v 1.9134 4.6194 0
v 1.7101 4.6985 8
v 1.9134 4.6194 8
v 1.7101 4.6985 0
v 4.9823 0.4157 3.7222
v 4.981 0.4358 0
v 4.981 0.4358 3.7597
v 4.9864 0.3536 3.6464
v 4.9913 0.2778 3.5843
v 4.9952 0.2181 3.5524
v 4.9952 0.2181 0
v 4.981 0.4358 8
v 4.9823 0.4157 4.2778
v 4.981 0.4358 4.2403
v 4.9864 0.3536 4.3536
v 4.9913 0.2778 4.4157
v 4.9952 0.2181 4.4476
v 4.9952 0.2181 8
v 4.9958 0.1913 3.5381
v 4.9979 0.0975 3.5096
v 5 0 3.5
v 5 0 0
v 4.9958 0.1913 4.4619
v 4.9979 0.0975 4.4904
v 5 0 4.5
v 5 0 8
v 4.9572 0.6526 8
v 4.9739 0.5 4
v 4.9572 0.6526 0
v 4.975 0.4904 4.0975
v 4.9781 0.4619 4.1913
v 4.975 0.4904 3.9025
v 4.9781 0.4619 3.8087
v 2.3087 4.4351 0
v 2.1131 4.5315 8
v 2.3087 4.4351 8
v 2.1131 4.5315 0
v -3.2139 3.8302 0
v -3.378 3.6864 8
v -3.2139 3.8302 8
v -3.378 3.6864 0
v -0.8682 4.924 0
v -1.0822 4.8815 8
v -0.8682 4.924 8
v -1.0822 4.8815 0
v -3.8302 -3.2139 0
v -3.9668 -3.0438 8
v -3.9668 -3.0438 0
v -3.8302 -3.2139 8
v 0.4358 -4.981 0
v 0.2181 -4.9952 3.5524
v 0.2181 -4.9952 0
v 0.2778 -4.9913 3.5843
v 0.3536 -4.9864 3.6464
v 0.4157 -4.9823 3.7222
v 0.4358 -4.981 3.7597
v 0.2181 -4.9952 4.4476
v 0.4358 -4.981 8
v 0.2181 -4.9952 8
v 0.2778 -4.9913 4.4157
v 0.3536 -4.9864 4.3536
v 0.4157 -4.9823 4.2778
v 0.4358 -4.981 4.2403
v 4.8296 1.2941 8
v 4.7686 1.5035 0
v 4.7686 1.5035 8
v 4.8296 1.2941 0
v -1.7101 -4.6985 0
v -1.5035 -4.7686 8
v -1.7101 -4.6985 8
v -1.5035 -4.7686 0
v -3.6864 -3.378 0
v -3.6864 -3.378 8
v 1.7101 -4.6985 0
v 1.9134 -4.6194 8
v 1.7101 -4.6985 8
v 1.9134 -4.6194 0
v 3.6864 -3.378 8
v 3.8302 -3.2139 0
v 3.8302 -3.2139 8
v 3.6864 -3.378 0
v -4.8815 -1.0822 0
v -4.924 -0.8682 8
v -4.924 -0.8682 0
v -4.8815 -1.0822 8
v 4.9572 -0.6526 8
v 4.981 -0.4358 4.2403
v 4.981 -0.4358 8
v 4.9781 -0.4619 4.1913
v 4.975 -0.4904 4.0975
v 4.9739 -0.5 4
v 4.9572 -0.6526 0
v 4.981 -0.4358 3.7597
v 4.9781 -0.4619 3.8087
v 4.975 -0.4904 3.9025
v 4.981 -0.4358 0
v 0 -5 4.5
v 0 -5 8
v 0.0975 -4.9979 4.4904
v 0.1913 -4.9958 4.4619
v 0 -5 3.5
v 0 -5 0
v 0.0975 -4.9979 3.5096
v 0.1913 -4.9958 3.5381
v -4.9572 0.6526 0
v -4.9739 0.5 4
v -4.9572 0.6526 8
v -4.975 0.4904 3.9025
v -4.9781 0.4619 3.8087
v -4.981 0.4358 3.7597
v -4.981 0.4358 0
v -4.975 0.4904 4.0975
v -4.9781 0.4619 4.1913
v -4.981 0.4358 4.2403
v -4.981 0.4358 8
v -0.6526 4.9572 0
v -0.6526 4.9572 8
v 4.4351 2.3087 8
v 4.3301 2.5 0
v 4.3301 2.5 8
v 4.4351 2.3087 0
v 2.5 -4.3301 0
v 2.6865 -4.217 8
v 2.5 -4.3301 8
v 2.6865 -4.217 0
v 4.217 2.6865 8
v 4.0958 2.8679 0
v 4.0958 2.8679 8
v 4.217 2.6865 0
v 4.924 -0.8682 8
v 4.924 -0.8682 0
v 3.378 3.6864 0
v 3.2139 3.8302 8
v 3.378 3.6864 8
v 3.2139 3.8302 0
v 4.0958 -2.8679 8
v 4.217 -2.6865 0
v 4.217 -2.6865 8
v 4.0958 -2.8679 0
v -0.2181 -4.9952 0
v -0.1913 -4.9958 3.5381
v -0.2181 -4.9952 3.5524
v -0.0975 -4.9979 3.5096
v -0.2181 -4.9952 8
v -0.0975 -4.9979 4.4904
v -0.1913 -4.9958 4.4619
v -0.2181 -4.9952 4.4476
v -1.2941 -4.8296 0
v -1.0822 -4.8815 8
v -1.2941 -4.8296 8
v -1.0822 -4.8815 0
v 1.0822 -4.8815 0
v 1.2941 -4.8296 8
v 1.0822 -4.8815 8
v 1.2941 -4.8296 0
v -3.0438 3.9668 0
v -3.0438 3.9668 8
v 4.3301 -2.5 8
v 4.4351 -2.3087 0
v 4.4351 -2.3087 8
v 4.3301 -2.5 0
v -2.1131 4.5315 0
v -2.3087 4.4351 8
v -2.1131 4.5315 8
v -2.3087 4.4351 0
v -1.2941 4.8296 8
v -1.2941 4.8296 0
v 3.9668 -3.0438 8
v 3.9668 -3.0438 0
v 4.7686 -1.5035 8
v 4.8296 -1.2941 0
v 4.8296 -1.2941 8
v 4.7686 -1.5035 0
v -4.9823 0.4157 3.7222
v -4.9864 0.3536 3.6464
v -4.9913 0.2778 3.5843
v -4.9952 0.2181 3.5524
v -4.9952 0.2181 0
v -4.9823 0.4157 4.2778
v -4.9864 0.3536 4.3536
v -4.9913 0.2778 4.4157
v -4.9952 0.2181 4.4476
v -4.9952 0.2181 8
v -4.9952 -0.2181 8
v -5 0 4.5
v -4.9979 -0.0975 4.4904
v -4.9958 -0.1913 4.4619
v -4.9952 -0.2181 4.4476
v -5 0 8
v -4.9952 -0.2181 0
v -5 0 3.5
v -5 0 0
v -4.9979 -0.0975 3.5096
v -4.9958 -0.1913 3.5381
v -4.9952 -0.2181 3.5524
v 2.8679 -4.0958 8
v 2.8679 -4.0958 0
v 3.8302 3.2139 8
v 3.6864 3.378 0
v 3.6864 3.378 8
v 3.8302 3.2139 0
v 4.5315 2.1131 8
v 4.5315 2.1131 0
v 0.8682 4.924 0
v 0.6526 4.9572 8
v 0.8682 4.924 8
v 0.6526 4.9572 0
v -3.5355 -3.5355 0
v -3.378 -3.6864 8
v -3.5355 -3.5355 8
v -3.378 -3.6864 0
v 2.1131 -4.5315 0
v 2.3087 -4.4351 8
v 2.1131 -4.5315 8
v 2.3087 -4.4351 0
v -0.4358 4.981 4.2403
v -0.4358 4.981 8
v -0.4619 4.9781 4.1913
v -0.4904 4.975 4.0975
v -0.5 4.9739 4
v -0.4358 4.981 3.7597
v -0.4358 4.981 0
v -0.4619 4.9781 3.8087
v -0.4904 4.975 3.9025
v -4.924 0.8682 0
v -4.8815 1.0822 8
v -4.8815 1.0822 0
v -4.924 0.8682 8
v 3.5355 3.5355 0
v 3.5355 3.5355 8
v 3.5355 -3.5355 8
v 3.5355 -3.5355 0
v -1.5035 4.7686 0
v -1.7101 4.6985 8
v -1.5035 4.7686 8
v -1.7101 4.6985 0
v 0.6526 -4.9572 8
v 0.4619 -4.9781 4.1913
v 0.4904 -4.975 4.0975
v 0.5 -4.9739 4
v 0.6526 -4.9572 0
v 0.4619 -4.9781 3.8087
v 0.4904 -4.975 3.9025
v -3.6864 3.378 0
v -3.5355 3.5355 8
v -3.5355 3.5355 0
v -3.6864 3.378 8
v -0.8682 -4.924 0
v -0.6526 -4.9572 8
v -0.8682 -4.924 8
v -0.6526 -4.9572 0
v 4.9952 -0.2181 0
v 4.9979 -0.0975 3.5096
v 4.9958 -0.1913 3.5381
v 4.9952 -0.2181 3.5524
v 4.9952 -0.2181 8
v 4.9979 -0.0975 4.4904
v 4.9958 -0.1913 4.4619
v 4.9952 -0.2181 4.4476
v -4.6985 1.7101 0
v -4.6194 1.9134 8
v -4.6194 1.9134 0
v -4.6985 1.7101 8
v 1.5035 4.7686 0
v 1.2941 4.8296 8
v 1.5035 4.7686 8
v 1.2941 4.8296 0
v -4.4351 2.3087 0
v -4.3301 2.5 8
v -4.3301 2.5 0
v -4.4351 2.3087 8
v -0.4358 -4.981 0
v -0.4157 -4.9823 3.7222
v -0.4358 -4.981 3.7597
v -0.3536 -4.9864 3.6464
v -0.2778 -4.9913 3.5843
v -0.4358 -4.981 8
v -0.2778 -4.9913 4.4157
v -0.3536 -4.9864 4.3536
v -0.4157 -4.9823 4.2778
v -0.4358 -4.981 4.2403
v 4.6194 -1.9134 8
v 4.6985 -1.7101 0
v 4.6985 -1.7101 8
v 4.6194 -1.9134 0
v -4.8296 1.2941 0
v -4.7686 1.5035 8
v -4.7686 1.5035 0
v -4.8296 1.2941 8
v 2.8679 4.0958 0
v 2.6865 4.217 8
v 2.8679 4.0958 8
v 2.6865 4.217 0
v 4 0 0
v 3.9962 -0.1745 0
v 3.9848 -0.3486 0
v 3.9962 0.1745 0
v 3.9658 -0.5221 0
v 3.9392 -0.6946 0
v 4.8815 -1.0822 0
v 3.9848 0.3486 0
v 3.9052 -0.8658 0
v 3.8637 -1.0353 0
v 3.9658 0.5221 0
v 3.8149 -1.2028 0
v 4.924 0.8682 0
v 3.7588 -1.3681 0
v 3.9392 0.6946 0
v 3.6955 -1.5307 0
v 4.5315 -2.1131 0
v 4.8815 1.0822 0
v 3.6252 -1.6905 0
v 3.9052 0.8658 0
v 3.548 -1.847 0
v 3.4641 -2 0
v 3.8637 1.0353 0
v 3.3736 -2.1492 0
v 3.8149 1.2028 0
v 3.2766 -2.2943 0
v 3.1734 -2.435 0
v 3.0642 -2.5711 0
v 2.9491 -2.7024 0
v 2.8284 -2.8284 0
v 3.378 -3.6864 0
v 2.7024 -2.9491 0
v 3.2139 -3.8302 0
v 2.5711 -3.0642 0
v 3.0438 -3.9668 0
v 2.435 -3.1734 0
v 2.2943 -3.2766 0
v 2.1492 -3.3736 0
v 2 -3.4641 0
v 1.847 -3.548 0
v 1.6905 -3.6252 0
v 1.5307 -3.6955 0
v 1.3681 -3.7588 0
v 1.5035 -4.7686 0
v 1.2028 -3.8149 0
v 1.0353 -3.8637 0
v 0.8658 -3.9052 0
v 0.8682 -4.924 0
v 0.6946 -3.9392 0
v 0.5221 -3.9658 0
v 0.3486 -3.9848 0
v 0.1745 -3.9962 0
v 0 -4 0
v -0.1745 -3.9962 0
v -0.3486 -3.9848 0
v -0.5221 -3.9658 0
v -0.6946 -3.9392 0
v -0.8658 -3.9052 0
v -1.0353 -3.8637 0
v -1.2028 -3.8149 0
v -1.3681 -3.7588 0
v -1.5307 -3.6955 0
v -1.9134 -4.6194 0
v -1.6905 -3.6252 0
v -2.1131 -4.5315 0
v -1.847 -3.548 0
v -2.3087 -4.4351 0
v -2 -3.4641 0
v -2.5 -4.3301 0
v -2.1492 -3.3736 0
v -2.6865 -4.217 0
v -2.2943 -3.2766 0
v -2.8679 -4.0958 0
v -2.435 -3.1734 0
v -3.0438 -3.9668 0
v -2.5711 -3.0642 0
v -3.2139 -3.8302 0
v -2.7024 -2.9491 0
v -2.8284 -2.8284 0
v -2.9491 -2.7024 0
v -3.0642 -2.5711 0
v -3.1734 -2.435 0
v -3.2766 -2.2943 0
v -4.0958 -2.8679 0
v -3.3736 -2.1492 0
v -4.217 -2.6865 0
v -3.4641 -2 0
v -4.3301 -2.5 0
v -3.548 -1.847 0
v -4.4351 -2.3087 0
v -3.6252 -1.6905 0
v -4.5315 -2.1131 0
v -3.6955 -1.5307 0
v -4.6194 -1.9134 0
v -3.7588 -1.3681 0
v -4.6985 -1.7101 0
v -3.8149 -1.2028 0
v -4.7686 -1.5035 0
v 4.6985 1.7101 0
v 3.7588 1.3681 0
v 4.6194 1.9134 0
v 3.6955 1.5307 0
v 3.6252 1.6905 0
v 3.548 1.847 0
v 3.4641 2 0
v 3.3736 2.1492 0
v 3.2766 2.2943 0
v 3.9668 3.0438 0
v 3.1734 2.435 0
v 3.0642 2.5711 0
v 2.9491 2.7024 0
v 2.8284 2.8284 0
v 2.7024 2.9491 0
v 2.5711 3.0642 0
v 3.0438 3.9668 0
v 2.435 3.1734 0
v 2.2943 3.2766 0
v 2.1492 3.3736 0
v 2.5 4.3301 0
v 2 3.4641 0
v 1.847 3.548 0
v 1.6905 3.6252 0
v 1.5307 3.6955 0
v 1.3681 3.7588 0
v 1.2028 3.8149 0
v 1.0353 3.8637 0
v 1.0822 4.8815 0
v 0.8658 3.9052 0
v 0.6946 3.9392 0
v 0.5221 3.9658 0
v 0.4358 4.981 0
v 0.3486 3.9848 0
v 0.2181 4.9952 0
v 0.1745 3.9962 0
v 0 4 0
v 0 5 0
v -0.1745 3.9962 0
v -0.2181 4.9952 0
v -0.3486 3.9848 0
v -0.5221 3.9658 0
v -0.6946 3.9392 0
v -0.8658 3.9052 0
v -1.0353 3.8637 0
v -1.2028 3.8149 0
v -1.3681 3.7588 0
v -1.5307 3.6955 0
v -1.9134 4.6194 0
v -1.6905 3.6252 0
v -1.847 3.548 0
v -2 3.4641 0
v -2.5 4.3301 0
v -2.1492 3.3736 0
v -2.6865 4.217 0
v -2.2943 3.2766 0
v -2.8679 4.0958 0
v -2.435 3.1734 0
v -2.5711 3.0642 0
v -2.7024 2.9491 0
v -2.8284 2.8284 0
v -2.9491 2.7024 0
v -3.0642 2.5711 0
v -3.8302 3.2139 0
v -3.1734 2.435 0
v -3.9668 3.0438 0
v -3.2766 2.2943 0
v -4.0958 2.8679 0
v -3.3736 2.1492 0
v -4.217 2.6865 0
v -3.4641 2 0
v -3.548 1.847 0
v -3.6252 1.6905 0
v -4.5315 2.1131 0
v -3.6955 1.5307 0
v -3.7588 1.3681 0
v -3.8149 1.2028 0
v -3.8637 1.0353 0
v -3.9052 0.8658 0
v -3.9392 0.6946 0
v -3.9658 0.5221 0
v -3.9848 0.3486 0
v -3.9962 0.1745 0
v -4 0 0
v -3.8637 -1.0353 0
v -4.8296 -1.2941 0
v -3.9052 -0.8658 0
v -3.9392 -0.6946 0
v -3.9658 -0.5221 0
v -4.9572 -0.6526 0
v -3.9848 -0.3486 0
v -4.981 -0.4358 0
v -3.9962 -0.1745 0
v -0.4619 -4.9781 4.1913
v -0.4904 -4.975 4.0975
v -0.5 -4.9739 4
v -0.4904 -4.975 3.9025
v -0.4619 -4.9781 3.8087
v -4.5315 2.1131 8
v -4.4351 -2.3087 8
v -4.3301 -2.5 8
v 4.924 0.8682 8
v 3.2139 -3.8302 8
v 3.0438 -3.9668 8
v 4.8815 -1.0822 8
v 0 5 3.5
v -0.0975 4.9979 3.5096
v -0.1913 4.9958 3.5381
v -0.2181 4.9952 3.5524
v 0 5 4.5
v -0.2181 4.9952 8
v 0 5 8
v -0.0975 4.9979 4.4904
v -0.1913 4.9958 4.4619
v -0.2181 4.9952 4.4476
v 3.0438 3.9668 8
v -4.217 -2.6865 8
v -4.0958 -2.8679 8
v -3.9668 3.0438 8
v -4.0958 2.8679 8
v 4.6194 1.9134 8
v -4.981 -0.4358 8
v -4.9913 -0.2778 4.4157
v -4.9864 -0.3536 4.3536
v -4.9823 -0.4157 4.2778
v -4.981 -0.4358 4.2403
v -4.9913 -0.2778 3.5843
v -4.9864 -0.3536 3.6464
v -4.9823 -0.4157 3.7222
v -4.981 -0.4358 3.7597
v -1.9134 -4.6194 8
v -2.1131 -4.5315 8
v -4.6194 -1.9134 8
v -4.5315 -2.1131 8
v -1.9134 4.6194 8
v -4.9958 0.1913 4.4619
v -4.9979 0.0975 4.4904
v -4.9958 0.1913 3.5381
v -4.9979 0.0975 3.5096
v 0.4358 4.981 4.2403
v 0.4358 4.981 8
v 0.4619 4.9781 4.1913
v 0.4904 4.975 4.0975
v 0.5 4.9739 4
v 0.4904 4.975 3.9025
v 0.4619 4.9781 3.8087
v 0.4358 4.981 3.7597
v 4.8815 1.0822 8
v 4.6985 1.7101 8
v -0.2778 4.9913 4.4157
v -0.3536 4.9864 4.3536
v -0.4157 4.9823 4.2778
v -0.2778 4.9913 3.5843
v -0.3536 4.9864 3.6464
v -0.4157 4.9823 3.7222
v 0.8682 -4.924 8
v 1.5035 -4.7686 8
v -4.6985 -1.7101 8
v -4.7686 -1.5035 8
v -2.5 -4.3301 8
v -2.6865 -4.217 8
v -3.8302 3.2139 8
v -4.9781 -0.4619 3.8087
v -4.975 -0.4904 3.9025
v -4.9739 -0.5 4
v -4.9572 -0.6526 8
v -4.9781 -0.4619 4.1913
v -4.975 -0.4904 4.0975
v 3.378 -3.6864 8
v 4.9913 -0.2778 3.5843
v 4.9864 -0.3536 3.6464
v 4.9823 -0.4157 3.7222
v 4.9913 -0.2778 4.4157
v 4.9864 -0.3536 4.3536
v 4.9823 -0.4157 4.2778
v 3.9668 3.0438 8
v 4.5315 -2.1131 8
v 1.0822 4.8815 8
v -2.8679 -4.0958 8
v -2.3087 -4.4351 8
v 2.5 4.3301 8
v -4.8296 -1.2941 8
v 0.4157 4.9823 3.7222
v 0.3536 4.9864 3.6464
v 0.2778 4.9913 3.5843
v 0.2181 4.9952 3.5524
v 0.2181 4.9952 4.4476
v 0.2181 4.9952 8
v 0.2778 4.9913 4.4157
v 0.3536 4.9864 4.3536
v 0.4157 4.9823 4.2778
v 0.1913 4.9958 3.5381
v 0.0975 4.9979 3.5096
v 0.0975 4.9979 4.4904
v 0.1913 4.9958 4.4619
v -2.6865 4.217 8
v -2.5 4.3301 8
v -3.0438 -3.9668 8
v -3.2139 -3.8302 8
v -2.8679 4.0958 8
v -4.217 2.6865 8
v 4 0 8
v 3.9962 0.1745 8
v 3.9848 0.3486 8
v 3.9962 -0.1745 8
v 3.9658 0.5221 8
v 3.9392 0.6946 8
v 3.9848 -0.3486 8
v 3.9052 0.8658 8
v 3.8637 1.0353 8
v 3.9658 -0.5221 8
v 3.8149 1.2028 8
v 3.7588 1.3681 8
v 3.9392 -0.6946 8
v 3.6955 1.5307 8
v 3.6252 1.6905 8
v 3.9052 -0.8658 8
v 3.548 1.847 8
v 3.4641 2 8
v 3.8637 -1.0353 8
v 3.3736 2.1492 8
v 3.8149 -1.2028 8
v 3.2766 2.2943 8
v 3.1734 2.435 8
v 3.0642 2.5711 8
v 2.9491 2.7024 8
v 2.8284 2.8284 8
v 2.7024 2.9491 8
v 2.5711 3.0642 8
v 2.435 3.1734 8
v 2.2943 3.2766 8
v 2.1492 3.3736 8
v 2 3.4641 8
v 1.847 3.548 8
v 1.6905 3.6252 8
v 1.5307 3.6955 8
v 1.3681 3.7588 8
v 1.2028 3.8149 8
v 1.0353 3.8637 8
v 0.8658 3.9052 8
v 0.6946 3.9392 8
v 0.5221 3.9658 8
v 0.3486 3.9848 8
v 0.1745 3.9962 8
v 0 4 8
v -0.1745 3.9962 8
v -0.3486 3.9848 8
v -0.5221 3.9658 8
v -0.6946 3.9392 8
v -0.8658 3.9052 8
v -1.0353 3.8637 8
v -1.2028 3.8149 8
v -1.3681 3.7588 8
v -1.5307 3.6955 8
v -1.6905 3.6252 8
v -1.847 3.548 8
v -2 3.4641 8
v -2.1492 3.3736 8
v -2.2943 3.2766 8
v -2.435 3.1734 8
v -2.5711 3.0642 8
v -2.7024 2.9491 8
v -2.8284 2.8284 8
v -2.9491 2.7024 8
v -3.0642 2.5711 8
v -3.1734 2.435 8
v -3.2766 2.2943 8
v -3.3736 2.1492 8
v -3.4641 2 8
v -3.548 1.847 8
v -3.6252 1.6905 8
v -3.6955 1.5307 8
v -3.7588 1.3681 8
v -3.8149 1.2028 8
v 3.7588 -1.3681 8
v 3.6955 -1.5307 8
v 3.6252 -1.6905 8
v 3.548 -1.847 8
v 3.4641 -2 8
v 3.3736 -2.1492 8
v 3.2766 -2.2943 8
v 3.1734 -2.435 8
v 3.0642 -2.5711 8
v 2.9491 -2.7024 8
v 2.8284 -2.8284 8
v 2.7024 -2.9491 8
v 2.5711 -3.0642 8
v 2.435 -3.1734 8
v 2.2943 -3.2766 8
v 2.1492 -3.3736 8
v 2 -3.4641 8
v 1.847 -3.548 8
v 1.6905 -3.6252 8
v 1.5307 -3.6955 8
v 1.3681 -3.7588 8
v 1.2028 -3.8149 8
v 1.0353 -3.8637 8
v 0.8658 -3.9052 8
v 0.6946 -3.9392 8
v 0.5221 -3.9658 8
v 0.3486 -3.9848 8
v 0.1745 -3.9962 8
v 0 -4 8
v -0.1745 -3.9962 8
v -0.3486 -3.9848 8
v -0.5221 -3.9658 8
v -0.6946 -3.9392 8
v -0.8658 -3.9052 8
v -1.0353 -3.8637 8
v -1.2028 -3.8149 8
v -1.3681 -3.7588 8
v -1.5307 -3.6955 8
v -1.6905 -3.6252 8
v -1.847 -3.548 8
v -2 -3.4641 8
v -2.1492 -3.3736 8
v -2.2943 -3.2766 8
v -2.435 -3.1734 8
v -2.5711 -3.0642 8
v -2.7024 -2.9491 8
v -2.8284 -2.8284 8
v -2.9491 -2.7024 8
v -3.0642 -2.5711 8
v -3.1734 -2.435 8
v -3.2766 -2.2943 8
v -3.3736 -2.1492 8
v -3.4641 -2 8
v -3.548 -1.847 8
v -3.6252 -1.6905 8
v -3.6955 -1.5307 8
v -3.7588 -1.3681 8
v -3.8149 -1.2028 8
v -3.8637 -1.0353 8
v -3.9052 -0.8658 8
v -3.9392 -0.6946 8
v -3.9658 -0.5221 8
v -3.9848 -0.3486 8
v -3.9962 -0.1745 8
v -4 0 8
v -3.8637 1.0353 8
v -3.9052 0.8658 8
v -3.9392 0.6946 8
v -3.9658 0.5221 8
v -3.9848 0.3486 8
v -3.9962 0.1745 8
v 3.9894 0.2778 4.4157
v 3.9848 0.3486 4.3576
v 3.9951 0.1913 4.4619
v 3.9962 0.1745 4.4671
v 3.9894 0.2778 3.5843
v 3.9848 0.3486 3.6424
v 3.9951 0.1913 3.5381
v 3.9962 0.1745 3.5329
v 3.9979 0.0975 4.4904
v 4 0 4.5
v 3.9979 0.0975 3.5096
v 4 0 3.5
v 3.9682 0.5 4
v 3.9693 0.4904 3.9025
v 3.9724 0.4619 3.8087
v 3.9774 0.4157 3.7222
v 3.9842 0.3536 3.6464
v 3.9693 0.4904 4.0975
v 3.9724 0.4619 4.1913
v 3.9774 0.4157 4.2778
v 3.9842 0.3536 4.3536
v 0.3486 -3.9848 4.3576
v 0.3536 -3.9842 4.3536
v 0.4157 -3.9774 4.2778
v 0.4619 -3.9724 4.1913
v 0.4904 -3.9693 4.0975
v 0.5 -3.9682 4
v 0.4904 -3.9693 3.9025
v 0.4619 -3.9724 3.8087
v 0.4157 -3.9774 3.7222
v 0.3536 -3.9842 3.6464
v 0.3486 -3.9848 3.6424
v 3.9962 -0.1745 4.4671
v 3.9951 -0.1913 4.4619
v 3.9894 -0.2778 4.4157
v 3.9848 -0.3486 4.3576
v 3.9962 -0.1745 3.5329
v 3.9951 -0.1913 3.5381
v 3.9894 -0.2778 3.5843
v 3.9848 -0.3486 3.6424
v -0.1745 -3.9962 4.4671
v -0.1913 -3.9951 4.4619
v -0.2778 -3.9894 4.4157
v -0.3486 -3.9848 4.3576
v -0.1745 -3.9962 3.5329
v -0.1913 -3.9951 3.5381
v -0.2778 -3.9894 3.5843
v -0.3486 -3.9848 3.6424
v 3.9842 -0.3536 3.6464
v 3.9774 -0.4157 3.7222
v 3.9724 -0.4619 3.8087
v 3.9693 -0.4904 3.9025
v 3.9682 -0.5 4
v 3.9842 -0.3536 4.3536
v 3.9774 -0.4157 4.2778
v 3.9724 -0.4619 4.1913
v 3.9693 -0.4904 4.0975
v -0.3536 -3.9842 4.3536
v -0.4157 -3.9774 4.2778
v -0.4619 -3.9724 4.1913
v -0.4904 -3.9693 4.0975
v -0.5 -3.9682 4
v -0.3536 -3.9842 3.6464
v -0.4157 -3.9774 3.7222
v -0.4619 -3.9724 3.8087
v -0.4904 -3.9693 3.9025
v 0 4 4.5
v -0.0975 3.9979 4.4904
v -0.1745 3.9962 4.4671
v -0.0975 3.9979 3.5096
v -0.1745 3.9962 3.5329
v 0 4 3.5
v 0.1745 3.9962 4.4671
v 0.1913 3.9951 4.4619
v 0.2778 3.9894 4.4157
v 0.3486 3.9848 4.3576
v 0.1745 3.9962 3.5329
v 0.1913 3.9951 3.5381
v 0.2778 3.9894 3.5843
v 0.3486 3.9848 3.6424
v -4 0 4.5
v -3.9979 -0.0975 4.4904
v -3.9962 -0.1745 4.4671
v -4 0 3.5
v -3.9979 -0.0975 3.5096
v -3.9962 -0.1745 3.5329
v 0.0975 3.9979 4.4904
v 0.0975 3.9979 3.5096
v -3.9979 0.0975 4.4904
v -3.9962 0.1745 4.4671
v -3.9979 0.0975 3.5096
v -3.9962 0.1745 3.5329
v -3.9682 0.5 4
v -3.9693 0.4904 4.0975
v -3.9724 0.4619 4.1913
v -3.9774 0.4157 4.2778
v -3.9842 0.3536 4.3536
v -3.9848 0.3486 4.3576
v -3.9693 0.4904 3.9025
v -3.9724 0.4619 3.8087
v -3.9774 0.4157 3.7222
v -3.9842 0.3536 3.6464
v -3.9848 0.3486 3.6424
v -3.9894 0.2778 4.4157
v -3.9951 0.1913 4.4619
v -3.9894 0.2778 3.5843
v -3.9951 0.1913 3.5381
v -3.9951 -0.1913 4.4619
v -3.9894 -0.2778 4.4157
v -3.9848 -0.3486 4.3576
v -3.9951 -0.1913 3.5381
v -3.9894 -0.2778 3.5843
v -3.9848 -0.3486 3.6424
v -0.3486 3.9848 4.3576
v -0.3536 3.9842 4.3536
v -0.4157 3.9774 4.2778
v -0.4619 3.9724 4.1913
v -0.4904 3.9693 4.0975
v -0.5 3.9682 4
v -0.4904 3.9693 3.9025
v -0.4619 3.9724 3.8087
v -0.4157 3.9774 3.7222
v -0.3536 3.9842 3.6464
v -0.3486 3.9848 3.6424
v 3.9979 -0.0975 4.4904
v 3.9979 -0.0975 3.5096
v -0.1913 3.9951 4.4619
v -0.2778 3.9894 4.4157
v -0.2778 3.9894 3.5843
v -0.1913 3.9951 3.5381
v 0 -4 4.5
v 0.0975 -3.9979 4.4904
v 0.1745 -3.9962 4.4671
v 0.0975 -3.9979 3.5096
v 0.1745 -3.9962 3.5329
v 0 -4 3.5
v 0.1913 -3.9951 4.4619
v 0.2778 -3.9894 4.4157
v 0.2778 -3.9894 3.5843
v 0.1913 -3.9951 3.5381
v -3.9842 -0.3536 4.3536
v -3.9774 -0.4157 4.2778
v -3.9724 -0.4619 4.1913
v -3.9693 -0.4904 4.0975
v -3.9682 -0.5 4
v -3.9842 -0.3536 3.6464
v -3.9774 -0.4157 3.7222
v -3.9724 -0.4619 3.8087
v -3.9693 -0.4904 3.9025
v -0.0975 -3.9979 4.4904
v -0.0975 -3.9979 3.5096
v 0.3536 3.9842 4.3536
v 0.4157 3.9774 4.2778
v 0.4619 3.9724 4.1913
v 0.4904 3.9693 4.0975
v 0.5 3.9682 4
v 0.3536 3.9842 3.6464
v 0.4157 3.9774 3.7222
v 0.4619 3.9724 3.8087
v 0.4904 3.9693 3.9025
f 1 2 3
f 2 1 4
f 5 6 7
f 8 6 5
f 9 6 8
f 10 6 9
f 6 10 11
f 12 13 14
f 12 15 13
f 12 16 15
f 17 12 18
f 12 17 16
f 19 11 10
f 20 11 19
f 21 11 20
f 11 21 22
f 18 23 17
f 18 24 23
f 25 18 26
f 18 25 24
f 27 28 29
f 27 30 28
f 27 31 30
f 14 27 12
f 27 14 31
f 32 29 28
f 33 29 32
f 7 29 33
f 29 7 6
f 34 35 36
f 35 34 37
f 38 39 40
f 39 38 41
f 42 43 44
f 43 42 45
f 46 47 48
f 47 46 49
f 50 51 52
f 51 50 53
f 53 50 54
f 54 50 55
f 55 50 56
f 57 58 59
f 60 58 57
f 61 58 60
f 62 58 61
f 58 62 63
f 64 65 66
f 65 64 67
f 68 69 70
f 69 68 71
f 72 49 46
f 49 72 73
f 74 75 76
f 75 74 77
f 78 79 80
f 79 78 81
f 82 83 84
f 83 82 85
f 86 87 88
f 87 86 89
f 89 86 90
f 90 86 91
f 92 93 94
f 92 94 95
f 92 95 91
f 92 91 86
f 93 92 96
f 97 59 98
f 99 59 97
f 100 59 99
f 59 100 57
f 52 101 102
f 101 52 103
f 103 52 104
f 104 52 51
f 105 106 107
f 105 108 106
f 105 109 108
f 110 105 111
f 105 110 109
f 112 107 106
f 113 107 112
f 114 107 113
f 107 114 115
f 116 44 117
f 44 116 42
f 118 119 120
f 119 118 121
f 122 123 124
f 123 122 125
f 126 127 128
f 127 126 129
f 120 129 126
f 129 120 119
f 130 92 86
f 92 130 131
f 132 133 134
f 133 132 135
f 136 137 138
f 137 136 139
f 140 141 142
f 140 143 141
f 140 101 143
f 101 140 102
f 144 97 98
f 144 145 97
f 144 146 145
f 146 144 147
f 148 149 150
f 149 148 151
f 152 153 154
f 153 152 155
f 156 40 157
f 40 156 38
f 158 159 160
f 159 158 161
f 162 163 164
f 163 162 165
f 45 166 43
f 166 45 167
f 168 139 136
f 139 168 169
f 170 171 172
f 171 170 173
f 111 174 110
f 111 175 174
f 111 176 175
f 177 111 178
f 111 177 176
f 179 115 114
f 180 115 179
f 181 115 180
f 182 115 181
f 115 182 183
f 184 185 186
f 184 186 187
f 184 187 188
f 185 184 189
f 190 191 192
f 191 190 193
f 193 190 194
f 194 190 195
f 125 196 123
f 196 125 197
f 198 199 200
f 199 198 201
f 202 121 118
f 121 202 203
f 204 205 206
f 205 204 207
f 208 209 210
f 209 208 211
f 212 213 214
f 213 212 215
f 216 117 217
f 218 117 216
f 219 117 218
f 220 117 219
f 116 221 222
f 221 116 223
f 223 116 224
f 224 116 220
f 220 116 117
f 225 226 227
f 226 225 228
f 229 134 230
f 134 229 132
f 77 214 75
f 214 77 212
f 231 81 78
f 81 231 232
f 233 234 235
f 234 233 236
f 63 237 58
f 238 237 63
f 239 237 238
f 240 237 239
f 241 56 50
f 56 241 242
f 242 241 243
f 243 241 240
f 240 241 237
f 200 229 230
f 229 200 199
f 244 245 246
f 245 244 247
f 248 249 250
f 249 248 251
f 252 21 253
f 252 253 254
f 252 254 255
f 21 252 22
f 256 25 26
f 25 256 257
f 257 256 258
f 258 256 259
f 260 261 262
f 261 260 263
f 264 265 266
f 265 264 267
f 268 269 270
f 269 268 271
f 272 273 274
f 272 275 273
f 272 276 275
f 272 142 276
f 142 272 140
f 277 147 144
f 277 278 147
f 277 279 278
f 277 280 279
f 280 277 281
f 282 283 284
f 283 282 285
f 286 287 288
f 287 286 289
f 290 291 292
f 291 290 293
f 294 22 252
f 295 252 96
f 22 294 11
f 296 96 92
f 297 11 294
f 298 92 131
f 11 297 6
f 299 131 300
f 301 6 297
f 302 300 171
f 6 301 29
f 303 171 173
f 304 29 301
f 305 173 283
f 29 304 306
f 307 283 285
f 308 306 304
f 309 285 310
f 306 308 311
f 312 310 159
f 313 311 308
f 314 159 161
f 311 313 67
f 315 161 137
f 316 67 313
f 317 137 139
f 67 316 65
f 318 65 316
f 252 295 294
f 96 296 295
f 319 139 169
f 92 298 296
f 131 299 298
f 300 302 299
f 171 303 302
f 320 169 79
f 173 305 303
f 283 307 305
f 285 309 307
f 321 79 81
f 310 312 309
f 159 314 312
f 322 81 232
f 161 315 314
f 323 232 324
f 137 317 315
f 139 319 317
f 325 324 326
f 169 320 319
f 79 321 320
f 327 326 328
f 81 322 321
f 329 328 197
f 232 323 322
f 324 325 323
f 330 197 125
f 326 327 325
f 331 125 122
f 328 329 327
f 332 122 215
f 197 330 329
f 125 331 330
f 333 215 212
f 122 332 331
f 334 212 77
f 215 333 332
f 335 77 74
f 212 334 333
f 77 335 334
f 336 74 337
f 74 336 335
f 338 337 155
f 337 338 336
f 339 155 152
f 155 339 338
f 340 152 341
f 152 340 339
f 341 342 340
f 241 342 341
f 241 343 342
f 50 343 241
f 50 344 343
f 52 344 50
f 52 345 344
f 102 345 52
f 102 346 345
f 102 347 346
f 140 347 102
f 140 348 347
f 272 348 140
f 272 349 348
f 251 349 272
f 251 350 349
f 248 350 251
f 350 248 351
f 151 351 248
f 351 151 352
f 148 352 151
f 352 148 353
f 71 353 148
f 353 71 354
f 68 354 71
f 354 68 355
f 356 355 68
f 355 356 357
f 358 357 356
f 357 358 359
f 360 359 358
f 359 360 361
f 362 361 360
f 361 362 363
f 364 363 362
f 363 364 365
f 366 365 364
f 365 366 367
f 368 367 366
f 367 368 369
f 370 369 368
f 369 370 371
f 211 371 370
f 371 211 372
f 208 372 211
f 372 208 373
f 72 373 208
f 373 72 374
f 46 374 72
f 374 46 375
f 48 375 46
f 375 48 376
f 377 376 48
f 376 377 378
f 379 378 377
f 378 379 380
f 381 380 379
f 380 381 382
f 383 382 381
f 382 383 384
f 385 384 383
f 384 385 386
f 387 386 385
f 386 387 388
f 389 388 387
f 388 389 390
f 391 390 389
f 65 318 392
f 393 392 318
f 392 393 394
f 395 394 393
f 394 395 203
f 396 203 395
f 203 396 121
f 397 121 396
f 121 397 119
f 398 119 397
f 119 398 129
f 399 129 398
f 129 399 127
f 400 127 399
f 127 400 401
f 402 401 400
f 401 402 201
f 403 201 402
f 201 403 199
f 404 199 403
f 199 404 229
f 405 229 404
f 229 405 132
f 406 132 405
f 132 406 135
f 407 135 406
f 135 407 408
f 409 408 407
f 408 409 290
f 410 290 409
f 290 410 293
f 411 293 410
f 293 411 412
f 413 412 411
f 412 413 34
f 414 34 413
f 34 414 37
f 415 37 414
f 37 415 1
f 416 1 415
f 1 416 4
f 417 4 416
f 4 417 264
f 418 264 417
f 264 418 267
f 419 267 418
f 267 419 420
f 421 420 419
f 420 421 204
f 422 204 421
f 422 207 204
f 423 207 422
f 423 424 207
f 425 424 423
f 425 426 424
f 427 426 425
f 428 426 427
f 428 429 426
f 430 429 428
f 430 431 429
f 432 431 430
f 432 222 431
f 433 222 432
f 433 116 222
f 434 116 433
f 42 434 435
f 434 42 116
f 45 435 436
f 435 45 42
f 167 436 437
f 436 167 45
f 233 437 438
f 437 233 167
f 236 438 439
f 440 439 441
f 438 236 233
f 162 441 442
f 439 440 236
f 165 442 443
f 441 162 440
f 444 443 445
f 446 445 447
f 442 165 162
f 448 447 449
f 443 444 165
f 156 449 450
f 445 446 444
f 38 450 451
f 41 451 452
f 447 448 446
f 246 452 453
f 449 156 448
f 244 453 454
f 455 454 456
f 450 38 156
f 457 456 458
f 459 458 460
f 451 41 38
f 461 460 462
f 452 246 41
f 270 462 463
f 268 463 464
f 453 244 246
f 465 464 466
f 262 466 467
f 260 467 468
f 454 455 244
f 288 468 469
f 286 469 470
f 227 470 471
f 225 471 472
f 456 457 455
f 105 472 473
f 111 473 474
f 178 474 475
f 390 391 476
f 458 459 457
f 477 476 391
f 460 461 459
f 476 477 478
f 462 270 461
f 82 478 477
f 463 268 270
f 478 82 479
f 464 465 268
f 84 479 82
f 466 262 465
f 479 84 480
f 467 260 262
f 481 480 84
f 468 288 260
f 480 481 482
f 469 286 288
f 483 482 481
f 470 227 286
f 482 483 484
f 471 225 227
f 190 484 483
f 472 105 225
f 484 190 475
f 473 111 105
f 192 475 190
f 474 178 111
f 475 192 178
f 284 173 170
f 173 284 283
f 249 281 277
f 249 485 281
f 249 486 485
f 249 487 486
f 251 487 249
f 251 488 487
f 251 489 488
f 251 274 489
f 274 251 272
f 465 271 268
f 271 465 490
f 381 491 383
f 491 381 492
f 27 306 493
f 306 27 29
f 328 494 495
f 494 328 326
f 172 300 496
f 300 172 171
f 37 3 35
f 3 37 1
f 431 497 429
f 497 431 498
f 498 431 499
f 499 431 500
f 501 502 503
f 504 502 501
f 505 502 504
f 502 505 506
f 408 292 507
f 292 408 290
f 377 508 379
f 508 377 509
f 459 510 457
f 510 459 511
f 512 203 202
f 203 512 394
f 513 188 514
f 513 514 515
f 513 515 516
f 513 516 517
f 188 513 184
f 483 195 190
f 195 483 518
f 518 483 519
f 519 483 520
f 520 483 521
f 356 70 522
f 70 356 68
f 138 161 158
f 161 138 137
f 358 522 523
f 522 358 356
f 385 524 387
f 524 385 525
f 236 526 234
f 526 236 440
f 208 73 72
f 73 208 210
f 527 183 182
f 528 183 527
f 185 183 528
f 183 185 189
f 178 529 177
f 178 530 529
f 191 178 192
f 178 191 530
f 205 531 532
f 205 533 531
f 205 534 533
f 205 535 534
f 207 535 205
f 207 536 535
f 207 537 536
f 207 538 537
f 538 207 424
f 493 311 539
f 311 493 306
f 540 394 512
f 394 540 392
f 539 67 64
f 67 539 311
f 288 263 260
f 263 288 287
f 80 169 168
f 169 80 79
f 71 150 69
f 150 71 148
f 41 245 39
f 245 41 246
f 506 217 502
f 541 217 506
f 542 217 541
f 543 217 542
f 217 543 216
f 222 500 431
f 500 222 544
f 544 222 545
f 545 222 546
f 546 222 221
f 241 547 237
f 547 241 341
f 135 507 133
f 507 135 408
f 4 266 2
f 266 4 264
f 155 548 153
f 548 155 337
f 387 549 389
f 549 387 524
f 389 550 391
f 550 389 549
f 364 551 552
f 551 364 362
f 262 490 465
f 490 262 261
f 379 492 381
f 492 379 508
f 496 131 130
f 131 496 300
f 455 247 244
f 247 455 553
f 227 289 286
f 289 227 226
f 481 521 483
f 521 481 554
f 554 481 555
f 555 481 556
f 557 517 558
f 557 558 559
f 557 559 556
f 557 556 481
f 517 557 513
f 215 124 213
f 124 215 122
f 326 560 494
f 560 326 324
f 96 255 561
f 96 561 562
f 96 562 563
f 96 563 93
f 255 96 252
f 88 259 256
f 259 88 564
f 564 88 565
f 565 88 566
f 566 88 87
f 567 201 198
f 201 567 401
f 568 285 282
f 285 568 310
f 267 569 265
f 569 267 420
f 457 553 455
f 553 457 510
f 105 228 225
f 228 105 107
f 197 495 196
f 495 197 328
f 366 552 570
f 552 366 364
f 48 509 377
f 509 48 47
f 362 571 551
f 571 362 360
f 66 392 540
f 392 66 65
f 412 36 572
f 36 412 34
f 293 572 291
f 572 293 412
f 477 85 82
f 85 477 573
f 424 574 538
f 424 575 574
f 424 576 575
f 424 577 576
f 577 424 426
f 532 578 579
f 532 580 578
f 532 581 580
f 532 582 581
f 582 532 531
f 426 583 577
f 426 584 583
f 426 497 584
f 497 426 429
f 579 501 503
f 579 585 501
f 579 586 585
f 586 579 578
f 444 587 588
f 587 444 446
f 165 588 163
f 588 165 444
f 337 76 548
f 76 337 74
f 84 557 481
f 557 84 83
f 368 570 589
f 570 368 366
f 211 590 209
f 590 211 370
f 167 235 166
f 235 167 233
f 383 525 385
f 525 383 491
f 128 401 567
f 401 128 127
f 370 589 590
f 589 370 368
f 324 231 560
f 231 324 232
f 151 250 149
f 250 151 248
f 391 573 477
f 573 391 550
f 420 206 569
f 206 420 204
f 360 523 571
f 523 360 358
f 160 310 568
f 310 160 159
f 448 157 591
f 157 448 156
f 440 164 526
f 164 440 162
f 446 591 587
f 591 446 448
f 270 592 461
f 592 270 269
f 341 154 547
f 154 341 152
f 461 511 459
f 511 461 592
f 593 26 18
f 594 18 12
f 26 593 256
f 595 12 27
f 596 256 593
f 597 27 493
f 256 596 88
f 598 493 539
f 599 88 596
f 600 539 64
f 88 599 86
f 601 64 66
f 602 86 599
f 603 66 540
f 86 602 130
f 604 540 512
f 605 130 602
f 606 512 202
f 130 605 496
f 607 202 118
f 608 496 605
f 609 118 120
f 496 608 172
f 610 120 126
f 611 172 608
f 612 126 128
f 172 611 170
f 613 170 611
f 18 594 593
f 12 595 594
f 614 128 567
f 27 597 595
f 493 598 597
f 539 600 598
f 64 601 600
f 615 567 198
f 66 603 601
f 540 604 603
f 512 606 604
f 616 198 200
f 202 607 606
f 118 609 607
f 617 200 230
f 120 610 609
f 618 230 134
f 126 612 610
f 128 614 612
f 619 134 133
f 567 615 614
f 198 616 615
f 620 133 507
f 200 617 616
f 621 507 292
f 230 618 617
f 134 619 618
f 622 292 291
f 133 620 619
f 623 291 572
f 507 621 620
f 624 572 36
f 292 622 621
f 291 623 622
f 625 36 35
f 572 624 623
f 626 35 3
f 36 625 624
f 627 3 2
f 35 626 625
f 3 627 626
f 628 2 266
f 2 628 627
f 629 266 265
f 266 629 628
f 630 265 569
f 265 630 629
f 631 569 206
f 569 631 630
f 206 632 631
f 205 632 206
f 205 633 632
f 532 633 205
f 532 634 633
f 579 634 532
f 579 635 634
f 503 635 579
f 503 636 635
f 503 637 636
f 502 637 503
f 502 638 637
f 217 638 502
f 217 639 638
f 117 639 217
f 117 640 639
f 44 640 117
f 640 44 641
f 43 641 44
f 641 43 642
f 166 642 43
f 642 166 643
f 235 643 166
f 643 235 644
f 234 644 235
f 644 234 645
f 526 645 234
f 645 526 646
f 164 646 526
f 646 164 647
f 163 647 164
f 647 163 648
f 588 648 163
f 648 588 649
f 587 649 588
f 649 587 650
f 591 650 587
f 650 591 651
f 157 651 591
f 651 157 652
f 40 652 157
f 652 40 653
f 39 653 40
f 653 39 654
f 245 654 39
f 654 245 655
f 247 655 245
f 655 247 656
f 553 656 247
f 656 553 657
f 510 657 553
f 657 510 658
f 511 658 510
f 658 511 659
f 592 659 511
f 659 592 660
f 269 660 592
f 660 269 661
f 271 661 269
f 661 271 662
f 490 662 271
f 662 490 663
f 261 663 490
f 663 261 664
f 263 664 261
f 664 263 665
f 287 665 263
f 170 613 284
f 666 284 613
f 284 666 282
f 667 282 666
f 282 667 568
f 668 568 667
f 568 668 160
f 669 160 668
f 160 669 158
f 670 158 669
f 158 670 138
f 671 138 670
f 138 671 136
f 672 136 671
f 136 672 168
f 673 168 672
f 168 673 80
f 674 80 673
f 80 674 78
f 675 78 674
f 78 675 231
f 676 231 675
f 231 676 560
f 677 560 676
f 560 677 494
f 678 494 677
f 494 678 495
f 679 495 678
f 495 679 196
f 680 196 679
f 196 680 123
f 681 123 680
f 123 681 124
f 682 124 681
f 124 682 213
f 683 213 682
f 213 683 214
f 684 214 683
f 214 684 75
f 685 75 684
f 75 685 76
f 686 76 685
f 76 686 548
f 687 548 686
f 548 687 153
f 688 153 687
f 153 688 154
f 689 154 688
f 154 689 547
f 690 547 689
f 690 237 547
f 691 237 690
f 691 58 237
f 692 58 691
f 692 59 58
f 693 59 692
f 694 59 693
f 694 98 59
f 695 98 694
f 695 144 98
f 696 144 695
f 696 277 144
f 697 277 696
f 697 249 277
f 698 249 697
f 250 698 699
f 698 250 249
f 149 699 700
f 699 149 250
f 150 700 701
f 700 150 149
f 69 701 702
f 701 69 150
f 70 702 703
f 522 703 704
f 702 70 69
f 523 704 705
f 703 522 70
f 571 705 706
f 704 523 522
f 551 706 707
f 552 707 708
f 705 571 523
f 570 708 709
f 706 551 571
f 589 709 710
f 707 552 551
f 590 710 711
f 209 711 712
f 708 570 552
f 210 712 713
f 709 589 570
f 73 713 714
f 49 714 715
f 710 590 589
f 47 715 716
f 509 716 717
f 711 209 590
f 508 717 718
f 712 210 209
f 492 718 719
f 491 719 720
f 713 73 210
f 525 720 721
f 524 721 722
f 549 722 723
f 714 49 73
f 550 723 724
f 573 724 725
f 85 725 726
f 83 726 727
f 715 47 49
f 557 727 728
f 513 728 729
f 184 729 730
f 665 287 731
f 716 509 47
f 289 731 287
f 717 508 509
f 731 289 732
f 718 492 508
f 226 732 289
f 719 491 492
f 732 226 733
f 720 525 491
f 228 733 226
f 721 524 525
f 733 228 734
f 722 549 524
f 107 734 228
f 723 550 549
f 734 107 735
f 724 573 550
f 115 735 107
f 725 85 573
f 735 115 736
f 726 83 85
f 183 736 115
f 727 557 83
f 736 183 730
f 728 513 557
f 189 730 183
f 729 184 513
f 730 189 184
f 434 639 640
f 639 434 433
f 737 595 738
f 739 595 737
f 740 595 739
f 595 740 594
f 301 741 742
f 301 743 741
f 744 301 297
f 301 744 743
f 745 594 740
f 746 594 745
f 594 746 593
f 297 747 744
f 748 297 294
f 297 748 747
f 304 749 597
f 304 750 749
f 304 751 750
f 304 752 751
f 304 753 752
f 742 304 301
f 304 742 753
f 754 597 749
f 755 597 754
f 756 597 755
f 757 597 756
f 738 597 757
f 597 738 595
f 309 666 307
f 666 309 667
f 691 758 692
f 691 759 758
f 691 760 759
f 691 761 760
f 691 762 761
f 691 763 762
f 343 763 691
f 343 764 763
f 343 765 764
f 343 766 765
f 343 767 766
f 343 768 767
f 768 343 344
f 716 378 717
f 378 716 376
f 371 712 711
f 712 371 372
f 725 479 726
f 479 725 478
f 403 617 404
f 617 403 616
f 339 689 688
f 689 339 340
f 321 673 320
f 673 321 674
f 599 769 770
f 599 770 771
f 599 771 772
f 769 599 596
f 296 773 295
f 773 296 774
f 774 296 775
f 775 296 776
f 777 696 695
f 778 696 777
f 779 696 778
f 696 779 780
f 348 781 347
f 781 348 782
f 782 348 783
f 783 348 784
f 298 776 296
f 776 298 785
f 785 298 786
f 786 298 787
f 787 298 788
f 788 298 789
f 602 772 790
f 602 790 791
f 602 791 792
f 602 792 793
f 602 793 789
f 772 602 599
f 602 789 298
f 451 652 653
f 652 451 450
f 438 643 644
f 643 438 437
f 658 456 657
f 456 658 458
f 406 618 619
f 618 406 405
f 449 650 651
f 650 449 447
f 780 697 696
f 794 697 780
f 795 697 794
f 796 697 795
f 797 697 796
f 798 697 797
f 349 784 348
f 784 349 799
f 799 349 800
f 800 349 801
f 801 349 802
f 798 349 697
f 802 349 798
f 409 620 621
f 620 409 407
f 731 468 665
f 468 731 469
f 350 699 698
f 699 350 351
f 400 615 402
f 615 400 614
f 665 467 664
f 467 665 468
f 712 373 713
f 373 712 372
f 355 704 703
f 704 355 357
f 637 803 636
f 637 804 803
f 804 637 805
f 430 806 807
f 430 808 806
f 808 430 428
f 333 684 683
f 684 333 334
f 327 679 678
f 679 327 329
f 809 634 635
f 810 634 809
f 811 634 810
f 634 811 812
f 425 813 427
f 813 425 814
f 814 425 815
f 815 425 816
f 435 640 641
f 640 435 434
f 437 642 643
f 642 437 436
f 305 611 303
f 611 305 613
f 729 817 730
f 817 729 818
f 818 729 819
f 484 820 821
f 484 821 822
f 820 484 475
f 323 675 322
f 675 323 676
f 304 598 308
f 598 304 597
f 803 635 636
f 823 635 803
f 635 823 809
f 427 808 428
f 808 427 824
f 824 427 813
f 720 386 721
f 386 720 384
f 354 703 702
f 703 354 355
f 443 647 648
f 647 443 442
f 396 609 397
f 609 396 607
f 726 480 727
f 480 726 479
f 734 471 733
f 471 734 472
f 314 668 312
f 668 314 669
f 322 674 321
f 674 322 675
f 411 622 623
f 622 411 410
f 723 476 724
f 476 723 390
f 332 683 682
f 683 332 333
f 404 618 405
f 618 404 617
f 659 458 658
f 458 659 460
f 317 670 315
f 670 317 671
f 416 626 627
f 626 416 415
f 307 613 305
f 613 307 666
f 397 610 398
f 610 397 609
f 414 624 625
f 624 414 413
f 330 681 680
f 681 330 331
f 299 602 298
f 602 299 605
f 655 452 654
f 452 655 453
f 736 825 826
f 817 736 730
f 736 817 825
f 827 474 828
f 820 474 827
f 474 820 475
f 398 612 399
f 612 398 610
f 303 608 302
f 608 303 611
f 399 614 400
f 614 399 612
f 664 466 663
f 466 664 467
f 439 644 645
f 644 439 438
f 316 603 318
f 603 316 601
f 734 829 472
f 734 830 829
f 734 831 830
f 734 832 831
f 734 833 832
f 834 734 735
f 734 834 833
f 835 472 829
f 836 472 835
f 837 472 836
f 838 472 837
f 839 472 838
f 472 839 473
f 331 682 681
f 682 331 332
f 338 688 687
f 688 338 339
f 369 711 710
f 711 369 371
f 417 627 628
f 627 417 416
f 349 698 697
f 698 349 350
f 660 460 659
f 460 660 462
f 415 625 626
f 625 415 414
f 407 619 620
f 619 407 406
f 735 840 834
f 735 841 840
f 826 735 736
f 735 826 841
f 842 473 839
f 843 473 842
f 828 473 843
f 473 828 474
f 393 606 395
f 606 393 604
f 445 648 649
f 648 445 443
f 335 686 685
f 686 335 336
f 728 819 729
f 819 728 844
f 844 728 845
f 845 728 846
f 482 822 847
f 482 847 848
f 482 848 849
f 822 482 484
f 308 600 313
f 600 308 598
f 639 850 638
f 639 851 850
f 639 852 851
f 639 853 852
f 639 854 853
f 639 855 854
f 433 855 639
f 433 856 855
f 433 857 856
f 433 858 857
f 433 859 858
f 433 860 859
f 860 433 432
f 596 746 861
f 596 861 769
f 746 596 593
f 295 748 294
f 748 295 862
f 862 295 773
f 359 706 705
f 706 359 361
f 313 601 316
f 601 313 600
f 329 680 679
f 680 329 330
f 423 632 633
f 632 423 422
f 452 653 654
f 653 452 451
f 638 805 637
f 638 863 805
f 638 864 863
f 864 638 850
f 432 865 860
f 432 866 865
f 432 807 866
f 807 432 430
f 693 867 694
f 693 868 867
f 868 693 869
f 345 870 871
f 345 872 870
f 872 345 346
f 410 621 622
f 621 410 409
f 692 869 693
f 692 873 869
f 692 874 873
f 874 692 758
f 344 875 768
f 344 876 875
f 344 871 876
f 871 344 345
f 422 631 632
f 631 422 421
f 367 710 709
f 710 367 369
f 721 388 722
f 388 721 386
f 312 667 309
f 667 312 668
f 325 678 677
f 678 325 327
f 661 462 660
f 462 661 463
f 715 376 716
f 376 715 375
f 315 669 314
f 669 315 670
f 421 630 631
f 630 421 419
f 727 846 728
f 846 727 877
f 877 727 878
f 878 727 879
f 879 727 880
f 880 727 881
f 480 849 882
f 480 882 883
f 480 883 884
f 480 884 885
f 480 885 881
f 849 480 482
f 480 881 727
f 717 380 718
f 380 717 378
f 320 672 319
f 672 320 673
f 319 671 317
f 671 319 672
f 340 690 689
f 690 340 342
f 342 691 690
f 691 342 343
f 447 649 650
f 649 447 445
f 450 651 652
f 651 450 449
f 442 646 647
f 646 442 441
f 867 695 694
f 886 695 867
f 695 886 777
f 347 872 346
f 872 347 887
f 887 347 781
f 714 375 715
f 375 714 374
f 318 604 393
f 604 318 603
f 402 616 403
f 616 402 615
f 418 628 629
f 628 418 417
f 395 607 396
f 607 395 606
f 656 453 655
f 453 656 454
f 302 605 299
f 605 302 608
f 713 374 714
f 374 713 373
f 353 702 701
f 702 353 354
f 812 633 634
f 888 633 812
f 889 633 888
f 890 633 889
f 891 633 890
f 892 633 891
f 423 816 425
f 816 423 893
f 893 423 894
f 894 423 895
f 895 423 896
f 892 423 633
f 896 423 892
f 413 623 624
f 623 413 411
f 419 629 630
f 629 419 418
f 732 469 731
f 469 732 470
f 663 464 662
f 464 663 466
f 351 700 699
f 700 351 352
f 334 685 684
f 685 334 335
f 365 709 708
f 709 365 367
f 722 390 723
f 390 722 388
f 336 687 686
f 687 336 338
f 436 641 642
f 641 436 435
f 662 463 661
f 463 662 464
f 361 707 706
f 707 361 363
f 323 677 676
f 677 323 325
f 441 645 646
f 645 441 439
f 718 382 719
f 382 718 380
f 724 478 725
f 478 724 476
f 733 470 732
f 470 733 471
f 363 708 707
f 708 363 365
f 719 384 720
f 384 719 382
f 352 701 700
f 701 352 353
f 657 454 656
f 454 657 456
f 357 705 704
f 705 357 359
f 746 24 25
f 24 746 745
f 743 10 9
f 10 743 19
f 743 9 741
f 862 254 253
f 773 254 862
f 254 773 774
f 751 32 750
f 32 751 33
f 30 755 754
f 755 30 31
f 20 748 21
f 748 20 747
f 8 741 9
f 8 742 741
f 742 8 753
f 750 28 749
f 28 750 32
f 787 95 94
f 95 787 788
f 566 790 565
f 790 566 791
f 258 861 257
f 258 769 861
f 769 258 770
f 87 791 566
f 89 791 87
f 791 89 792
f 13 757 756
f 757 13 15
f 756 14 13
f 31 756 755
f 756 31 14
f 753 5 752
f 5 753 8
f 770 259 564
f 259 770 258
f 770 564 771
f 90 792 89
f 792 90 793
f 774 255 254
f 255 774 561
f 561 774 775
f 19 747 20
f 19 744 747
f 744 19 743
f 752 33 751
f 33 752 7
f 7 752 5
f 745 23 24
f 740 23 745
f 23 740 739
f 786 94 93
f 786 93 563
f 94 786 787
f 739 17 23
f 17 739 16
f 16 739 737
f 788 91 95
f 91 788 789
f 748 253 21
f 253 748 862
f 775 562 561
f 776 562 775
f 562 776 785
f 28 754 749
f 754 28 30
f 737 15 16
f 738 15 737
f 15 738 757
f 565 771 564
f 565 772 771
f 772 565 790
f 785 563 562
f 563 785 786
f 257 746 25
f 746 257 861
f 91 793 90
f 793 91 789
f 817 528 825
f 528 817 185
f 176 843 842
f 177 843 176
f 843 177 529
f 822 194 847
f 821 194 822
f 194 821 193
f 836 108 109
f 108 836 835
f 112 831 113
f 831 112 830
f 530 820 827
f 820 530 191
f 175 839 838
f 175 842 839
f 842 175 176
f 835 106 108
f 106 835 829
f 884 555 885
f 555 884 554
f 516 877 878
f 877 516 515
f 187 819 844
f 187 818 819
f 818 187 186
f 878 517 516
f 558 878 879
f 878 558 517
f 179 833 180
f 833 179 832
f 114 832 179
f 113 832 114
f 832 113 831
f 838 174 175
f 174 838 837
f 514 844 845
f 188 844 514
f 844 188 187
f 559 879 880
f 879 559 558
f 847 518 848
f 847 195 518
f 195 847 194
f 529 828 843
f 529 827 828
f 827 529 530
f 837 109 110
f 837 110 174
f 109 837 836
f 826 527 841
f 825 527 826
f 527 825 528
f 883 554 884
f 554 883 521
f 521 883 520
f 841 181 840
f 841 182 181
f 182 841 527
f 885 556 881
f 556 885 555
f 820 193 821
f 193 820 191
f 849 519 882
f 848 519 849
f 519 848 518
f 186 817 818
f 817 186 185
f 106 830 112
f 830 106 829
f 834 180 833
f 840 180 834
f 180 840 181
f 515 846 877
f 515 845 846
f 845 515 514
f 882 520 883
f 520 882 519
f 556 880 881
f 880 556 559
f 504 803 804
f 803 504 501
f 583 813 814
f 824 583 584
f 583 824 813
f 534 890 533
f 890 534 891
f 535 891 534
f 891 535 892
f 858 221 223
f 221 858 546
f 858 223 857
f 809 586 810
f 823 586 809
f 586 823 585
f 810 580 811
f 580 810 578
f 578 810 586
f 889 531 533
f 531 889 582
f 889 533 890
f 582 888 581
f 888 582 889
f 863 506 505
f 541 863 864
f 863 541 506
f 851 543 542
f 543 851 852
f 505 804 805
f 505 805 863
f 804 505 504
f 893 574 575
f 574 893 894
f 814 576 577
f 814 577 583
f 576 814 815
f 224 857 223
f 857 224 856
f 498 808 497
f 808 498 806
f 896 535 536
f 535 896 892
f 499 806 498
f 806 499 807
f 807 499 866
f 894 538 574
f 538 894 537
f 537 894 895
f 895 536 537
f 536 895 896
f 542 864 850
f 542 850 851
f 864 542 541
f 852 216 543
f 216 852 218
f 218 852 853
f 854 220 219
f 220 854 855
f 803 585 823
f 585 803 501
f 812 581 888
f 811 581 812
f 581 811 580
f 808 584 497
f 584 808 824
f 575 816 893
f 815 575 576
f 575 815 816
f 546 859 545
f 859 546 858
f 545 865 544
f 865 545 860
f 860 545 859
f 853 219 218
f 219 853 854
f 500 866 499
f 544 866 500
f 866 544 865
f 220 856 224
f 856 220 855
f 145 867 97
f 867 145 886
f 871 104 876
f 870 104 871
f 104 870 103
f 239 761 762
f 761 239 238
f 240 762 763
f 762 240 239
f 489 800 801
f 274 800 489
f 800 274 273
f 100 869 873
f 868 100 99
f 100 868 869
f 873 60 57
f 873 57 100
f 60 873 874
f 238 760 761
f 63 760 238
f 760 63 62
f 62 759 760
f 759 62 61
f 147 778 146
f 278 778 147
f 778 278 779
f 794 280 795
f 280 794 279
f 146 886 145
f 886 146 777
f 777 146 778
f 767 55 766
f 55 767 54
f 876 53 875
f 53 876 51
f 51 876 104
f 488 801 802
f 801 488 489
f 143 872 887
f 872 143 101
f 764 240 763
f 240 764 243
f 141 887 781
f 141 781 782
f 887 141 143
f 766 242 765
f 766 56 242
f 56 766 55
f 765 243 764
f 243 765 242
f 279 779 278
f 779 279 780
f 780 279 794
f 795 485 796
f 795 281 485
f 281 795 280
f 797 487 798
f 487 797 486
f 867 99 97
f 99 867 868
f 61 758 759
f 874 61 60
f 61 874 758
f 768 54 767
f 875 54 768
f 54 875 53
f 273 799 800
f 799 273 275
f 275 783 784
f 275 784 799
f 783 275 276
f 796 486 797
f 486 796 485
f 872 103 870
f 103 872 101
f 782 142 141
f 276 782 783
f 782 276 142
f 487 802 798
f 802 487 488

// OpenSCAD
$fs = 0.1;
$fa = 2.5;

module outlet(thickness)
{

    color("red")cylinder(thickness + 0.5, 0.5, 0.5,true);

}
//


H = 8;
outerD = 5;
thickness = 1;
difference()
    {
color ("grey") cylinder(H, r = outerD);
translate([0,0,-1]){	color("orange") cylinder(H + 2, r = (outerD-thickness)); }

translate([4.5,0,4]){rotate([0,90,0]){outlet(0.8);}}
translate([-4.5,0,4]){rotate([0,90,0]){outlet(0.8);}}
translate([0,4.5,4]){rotate([90,0,0]){outlet(0.8);}}
translate([0,-4.5,4]){rotate([90,0,0]){outlet(0.8);}}

}
